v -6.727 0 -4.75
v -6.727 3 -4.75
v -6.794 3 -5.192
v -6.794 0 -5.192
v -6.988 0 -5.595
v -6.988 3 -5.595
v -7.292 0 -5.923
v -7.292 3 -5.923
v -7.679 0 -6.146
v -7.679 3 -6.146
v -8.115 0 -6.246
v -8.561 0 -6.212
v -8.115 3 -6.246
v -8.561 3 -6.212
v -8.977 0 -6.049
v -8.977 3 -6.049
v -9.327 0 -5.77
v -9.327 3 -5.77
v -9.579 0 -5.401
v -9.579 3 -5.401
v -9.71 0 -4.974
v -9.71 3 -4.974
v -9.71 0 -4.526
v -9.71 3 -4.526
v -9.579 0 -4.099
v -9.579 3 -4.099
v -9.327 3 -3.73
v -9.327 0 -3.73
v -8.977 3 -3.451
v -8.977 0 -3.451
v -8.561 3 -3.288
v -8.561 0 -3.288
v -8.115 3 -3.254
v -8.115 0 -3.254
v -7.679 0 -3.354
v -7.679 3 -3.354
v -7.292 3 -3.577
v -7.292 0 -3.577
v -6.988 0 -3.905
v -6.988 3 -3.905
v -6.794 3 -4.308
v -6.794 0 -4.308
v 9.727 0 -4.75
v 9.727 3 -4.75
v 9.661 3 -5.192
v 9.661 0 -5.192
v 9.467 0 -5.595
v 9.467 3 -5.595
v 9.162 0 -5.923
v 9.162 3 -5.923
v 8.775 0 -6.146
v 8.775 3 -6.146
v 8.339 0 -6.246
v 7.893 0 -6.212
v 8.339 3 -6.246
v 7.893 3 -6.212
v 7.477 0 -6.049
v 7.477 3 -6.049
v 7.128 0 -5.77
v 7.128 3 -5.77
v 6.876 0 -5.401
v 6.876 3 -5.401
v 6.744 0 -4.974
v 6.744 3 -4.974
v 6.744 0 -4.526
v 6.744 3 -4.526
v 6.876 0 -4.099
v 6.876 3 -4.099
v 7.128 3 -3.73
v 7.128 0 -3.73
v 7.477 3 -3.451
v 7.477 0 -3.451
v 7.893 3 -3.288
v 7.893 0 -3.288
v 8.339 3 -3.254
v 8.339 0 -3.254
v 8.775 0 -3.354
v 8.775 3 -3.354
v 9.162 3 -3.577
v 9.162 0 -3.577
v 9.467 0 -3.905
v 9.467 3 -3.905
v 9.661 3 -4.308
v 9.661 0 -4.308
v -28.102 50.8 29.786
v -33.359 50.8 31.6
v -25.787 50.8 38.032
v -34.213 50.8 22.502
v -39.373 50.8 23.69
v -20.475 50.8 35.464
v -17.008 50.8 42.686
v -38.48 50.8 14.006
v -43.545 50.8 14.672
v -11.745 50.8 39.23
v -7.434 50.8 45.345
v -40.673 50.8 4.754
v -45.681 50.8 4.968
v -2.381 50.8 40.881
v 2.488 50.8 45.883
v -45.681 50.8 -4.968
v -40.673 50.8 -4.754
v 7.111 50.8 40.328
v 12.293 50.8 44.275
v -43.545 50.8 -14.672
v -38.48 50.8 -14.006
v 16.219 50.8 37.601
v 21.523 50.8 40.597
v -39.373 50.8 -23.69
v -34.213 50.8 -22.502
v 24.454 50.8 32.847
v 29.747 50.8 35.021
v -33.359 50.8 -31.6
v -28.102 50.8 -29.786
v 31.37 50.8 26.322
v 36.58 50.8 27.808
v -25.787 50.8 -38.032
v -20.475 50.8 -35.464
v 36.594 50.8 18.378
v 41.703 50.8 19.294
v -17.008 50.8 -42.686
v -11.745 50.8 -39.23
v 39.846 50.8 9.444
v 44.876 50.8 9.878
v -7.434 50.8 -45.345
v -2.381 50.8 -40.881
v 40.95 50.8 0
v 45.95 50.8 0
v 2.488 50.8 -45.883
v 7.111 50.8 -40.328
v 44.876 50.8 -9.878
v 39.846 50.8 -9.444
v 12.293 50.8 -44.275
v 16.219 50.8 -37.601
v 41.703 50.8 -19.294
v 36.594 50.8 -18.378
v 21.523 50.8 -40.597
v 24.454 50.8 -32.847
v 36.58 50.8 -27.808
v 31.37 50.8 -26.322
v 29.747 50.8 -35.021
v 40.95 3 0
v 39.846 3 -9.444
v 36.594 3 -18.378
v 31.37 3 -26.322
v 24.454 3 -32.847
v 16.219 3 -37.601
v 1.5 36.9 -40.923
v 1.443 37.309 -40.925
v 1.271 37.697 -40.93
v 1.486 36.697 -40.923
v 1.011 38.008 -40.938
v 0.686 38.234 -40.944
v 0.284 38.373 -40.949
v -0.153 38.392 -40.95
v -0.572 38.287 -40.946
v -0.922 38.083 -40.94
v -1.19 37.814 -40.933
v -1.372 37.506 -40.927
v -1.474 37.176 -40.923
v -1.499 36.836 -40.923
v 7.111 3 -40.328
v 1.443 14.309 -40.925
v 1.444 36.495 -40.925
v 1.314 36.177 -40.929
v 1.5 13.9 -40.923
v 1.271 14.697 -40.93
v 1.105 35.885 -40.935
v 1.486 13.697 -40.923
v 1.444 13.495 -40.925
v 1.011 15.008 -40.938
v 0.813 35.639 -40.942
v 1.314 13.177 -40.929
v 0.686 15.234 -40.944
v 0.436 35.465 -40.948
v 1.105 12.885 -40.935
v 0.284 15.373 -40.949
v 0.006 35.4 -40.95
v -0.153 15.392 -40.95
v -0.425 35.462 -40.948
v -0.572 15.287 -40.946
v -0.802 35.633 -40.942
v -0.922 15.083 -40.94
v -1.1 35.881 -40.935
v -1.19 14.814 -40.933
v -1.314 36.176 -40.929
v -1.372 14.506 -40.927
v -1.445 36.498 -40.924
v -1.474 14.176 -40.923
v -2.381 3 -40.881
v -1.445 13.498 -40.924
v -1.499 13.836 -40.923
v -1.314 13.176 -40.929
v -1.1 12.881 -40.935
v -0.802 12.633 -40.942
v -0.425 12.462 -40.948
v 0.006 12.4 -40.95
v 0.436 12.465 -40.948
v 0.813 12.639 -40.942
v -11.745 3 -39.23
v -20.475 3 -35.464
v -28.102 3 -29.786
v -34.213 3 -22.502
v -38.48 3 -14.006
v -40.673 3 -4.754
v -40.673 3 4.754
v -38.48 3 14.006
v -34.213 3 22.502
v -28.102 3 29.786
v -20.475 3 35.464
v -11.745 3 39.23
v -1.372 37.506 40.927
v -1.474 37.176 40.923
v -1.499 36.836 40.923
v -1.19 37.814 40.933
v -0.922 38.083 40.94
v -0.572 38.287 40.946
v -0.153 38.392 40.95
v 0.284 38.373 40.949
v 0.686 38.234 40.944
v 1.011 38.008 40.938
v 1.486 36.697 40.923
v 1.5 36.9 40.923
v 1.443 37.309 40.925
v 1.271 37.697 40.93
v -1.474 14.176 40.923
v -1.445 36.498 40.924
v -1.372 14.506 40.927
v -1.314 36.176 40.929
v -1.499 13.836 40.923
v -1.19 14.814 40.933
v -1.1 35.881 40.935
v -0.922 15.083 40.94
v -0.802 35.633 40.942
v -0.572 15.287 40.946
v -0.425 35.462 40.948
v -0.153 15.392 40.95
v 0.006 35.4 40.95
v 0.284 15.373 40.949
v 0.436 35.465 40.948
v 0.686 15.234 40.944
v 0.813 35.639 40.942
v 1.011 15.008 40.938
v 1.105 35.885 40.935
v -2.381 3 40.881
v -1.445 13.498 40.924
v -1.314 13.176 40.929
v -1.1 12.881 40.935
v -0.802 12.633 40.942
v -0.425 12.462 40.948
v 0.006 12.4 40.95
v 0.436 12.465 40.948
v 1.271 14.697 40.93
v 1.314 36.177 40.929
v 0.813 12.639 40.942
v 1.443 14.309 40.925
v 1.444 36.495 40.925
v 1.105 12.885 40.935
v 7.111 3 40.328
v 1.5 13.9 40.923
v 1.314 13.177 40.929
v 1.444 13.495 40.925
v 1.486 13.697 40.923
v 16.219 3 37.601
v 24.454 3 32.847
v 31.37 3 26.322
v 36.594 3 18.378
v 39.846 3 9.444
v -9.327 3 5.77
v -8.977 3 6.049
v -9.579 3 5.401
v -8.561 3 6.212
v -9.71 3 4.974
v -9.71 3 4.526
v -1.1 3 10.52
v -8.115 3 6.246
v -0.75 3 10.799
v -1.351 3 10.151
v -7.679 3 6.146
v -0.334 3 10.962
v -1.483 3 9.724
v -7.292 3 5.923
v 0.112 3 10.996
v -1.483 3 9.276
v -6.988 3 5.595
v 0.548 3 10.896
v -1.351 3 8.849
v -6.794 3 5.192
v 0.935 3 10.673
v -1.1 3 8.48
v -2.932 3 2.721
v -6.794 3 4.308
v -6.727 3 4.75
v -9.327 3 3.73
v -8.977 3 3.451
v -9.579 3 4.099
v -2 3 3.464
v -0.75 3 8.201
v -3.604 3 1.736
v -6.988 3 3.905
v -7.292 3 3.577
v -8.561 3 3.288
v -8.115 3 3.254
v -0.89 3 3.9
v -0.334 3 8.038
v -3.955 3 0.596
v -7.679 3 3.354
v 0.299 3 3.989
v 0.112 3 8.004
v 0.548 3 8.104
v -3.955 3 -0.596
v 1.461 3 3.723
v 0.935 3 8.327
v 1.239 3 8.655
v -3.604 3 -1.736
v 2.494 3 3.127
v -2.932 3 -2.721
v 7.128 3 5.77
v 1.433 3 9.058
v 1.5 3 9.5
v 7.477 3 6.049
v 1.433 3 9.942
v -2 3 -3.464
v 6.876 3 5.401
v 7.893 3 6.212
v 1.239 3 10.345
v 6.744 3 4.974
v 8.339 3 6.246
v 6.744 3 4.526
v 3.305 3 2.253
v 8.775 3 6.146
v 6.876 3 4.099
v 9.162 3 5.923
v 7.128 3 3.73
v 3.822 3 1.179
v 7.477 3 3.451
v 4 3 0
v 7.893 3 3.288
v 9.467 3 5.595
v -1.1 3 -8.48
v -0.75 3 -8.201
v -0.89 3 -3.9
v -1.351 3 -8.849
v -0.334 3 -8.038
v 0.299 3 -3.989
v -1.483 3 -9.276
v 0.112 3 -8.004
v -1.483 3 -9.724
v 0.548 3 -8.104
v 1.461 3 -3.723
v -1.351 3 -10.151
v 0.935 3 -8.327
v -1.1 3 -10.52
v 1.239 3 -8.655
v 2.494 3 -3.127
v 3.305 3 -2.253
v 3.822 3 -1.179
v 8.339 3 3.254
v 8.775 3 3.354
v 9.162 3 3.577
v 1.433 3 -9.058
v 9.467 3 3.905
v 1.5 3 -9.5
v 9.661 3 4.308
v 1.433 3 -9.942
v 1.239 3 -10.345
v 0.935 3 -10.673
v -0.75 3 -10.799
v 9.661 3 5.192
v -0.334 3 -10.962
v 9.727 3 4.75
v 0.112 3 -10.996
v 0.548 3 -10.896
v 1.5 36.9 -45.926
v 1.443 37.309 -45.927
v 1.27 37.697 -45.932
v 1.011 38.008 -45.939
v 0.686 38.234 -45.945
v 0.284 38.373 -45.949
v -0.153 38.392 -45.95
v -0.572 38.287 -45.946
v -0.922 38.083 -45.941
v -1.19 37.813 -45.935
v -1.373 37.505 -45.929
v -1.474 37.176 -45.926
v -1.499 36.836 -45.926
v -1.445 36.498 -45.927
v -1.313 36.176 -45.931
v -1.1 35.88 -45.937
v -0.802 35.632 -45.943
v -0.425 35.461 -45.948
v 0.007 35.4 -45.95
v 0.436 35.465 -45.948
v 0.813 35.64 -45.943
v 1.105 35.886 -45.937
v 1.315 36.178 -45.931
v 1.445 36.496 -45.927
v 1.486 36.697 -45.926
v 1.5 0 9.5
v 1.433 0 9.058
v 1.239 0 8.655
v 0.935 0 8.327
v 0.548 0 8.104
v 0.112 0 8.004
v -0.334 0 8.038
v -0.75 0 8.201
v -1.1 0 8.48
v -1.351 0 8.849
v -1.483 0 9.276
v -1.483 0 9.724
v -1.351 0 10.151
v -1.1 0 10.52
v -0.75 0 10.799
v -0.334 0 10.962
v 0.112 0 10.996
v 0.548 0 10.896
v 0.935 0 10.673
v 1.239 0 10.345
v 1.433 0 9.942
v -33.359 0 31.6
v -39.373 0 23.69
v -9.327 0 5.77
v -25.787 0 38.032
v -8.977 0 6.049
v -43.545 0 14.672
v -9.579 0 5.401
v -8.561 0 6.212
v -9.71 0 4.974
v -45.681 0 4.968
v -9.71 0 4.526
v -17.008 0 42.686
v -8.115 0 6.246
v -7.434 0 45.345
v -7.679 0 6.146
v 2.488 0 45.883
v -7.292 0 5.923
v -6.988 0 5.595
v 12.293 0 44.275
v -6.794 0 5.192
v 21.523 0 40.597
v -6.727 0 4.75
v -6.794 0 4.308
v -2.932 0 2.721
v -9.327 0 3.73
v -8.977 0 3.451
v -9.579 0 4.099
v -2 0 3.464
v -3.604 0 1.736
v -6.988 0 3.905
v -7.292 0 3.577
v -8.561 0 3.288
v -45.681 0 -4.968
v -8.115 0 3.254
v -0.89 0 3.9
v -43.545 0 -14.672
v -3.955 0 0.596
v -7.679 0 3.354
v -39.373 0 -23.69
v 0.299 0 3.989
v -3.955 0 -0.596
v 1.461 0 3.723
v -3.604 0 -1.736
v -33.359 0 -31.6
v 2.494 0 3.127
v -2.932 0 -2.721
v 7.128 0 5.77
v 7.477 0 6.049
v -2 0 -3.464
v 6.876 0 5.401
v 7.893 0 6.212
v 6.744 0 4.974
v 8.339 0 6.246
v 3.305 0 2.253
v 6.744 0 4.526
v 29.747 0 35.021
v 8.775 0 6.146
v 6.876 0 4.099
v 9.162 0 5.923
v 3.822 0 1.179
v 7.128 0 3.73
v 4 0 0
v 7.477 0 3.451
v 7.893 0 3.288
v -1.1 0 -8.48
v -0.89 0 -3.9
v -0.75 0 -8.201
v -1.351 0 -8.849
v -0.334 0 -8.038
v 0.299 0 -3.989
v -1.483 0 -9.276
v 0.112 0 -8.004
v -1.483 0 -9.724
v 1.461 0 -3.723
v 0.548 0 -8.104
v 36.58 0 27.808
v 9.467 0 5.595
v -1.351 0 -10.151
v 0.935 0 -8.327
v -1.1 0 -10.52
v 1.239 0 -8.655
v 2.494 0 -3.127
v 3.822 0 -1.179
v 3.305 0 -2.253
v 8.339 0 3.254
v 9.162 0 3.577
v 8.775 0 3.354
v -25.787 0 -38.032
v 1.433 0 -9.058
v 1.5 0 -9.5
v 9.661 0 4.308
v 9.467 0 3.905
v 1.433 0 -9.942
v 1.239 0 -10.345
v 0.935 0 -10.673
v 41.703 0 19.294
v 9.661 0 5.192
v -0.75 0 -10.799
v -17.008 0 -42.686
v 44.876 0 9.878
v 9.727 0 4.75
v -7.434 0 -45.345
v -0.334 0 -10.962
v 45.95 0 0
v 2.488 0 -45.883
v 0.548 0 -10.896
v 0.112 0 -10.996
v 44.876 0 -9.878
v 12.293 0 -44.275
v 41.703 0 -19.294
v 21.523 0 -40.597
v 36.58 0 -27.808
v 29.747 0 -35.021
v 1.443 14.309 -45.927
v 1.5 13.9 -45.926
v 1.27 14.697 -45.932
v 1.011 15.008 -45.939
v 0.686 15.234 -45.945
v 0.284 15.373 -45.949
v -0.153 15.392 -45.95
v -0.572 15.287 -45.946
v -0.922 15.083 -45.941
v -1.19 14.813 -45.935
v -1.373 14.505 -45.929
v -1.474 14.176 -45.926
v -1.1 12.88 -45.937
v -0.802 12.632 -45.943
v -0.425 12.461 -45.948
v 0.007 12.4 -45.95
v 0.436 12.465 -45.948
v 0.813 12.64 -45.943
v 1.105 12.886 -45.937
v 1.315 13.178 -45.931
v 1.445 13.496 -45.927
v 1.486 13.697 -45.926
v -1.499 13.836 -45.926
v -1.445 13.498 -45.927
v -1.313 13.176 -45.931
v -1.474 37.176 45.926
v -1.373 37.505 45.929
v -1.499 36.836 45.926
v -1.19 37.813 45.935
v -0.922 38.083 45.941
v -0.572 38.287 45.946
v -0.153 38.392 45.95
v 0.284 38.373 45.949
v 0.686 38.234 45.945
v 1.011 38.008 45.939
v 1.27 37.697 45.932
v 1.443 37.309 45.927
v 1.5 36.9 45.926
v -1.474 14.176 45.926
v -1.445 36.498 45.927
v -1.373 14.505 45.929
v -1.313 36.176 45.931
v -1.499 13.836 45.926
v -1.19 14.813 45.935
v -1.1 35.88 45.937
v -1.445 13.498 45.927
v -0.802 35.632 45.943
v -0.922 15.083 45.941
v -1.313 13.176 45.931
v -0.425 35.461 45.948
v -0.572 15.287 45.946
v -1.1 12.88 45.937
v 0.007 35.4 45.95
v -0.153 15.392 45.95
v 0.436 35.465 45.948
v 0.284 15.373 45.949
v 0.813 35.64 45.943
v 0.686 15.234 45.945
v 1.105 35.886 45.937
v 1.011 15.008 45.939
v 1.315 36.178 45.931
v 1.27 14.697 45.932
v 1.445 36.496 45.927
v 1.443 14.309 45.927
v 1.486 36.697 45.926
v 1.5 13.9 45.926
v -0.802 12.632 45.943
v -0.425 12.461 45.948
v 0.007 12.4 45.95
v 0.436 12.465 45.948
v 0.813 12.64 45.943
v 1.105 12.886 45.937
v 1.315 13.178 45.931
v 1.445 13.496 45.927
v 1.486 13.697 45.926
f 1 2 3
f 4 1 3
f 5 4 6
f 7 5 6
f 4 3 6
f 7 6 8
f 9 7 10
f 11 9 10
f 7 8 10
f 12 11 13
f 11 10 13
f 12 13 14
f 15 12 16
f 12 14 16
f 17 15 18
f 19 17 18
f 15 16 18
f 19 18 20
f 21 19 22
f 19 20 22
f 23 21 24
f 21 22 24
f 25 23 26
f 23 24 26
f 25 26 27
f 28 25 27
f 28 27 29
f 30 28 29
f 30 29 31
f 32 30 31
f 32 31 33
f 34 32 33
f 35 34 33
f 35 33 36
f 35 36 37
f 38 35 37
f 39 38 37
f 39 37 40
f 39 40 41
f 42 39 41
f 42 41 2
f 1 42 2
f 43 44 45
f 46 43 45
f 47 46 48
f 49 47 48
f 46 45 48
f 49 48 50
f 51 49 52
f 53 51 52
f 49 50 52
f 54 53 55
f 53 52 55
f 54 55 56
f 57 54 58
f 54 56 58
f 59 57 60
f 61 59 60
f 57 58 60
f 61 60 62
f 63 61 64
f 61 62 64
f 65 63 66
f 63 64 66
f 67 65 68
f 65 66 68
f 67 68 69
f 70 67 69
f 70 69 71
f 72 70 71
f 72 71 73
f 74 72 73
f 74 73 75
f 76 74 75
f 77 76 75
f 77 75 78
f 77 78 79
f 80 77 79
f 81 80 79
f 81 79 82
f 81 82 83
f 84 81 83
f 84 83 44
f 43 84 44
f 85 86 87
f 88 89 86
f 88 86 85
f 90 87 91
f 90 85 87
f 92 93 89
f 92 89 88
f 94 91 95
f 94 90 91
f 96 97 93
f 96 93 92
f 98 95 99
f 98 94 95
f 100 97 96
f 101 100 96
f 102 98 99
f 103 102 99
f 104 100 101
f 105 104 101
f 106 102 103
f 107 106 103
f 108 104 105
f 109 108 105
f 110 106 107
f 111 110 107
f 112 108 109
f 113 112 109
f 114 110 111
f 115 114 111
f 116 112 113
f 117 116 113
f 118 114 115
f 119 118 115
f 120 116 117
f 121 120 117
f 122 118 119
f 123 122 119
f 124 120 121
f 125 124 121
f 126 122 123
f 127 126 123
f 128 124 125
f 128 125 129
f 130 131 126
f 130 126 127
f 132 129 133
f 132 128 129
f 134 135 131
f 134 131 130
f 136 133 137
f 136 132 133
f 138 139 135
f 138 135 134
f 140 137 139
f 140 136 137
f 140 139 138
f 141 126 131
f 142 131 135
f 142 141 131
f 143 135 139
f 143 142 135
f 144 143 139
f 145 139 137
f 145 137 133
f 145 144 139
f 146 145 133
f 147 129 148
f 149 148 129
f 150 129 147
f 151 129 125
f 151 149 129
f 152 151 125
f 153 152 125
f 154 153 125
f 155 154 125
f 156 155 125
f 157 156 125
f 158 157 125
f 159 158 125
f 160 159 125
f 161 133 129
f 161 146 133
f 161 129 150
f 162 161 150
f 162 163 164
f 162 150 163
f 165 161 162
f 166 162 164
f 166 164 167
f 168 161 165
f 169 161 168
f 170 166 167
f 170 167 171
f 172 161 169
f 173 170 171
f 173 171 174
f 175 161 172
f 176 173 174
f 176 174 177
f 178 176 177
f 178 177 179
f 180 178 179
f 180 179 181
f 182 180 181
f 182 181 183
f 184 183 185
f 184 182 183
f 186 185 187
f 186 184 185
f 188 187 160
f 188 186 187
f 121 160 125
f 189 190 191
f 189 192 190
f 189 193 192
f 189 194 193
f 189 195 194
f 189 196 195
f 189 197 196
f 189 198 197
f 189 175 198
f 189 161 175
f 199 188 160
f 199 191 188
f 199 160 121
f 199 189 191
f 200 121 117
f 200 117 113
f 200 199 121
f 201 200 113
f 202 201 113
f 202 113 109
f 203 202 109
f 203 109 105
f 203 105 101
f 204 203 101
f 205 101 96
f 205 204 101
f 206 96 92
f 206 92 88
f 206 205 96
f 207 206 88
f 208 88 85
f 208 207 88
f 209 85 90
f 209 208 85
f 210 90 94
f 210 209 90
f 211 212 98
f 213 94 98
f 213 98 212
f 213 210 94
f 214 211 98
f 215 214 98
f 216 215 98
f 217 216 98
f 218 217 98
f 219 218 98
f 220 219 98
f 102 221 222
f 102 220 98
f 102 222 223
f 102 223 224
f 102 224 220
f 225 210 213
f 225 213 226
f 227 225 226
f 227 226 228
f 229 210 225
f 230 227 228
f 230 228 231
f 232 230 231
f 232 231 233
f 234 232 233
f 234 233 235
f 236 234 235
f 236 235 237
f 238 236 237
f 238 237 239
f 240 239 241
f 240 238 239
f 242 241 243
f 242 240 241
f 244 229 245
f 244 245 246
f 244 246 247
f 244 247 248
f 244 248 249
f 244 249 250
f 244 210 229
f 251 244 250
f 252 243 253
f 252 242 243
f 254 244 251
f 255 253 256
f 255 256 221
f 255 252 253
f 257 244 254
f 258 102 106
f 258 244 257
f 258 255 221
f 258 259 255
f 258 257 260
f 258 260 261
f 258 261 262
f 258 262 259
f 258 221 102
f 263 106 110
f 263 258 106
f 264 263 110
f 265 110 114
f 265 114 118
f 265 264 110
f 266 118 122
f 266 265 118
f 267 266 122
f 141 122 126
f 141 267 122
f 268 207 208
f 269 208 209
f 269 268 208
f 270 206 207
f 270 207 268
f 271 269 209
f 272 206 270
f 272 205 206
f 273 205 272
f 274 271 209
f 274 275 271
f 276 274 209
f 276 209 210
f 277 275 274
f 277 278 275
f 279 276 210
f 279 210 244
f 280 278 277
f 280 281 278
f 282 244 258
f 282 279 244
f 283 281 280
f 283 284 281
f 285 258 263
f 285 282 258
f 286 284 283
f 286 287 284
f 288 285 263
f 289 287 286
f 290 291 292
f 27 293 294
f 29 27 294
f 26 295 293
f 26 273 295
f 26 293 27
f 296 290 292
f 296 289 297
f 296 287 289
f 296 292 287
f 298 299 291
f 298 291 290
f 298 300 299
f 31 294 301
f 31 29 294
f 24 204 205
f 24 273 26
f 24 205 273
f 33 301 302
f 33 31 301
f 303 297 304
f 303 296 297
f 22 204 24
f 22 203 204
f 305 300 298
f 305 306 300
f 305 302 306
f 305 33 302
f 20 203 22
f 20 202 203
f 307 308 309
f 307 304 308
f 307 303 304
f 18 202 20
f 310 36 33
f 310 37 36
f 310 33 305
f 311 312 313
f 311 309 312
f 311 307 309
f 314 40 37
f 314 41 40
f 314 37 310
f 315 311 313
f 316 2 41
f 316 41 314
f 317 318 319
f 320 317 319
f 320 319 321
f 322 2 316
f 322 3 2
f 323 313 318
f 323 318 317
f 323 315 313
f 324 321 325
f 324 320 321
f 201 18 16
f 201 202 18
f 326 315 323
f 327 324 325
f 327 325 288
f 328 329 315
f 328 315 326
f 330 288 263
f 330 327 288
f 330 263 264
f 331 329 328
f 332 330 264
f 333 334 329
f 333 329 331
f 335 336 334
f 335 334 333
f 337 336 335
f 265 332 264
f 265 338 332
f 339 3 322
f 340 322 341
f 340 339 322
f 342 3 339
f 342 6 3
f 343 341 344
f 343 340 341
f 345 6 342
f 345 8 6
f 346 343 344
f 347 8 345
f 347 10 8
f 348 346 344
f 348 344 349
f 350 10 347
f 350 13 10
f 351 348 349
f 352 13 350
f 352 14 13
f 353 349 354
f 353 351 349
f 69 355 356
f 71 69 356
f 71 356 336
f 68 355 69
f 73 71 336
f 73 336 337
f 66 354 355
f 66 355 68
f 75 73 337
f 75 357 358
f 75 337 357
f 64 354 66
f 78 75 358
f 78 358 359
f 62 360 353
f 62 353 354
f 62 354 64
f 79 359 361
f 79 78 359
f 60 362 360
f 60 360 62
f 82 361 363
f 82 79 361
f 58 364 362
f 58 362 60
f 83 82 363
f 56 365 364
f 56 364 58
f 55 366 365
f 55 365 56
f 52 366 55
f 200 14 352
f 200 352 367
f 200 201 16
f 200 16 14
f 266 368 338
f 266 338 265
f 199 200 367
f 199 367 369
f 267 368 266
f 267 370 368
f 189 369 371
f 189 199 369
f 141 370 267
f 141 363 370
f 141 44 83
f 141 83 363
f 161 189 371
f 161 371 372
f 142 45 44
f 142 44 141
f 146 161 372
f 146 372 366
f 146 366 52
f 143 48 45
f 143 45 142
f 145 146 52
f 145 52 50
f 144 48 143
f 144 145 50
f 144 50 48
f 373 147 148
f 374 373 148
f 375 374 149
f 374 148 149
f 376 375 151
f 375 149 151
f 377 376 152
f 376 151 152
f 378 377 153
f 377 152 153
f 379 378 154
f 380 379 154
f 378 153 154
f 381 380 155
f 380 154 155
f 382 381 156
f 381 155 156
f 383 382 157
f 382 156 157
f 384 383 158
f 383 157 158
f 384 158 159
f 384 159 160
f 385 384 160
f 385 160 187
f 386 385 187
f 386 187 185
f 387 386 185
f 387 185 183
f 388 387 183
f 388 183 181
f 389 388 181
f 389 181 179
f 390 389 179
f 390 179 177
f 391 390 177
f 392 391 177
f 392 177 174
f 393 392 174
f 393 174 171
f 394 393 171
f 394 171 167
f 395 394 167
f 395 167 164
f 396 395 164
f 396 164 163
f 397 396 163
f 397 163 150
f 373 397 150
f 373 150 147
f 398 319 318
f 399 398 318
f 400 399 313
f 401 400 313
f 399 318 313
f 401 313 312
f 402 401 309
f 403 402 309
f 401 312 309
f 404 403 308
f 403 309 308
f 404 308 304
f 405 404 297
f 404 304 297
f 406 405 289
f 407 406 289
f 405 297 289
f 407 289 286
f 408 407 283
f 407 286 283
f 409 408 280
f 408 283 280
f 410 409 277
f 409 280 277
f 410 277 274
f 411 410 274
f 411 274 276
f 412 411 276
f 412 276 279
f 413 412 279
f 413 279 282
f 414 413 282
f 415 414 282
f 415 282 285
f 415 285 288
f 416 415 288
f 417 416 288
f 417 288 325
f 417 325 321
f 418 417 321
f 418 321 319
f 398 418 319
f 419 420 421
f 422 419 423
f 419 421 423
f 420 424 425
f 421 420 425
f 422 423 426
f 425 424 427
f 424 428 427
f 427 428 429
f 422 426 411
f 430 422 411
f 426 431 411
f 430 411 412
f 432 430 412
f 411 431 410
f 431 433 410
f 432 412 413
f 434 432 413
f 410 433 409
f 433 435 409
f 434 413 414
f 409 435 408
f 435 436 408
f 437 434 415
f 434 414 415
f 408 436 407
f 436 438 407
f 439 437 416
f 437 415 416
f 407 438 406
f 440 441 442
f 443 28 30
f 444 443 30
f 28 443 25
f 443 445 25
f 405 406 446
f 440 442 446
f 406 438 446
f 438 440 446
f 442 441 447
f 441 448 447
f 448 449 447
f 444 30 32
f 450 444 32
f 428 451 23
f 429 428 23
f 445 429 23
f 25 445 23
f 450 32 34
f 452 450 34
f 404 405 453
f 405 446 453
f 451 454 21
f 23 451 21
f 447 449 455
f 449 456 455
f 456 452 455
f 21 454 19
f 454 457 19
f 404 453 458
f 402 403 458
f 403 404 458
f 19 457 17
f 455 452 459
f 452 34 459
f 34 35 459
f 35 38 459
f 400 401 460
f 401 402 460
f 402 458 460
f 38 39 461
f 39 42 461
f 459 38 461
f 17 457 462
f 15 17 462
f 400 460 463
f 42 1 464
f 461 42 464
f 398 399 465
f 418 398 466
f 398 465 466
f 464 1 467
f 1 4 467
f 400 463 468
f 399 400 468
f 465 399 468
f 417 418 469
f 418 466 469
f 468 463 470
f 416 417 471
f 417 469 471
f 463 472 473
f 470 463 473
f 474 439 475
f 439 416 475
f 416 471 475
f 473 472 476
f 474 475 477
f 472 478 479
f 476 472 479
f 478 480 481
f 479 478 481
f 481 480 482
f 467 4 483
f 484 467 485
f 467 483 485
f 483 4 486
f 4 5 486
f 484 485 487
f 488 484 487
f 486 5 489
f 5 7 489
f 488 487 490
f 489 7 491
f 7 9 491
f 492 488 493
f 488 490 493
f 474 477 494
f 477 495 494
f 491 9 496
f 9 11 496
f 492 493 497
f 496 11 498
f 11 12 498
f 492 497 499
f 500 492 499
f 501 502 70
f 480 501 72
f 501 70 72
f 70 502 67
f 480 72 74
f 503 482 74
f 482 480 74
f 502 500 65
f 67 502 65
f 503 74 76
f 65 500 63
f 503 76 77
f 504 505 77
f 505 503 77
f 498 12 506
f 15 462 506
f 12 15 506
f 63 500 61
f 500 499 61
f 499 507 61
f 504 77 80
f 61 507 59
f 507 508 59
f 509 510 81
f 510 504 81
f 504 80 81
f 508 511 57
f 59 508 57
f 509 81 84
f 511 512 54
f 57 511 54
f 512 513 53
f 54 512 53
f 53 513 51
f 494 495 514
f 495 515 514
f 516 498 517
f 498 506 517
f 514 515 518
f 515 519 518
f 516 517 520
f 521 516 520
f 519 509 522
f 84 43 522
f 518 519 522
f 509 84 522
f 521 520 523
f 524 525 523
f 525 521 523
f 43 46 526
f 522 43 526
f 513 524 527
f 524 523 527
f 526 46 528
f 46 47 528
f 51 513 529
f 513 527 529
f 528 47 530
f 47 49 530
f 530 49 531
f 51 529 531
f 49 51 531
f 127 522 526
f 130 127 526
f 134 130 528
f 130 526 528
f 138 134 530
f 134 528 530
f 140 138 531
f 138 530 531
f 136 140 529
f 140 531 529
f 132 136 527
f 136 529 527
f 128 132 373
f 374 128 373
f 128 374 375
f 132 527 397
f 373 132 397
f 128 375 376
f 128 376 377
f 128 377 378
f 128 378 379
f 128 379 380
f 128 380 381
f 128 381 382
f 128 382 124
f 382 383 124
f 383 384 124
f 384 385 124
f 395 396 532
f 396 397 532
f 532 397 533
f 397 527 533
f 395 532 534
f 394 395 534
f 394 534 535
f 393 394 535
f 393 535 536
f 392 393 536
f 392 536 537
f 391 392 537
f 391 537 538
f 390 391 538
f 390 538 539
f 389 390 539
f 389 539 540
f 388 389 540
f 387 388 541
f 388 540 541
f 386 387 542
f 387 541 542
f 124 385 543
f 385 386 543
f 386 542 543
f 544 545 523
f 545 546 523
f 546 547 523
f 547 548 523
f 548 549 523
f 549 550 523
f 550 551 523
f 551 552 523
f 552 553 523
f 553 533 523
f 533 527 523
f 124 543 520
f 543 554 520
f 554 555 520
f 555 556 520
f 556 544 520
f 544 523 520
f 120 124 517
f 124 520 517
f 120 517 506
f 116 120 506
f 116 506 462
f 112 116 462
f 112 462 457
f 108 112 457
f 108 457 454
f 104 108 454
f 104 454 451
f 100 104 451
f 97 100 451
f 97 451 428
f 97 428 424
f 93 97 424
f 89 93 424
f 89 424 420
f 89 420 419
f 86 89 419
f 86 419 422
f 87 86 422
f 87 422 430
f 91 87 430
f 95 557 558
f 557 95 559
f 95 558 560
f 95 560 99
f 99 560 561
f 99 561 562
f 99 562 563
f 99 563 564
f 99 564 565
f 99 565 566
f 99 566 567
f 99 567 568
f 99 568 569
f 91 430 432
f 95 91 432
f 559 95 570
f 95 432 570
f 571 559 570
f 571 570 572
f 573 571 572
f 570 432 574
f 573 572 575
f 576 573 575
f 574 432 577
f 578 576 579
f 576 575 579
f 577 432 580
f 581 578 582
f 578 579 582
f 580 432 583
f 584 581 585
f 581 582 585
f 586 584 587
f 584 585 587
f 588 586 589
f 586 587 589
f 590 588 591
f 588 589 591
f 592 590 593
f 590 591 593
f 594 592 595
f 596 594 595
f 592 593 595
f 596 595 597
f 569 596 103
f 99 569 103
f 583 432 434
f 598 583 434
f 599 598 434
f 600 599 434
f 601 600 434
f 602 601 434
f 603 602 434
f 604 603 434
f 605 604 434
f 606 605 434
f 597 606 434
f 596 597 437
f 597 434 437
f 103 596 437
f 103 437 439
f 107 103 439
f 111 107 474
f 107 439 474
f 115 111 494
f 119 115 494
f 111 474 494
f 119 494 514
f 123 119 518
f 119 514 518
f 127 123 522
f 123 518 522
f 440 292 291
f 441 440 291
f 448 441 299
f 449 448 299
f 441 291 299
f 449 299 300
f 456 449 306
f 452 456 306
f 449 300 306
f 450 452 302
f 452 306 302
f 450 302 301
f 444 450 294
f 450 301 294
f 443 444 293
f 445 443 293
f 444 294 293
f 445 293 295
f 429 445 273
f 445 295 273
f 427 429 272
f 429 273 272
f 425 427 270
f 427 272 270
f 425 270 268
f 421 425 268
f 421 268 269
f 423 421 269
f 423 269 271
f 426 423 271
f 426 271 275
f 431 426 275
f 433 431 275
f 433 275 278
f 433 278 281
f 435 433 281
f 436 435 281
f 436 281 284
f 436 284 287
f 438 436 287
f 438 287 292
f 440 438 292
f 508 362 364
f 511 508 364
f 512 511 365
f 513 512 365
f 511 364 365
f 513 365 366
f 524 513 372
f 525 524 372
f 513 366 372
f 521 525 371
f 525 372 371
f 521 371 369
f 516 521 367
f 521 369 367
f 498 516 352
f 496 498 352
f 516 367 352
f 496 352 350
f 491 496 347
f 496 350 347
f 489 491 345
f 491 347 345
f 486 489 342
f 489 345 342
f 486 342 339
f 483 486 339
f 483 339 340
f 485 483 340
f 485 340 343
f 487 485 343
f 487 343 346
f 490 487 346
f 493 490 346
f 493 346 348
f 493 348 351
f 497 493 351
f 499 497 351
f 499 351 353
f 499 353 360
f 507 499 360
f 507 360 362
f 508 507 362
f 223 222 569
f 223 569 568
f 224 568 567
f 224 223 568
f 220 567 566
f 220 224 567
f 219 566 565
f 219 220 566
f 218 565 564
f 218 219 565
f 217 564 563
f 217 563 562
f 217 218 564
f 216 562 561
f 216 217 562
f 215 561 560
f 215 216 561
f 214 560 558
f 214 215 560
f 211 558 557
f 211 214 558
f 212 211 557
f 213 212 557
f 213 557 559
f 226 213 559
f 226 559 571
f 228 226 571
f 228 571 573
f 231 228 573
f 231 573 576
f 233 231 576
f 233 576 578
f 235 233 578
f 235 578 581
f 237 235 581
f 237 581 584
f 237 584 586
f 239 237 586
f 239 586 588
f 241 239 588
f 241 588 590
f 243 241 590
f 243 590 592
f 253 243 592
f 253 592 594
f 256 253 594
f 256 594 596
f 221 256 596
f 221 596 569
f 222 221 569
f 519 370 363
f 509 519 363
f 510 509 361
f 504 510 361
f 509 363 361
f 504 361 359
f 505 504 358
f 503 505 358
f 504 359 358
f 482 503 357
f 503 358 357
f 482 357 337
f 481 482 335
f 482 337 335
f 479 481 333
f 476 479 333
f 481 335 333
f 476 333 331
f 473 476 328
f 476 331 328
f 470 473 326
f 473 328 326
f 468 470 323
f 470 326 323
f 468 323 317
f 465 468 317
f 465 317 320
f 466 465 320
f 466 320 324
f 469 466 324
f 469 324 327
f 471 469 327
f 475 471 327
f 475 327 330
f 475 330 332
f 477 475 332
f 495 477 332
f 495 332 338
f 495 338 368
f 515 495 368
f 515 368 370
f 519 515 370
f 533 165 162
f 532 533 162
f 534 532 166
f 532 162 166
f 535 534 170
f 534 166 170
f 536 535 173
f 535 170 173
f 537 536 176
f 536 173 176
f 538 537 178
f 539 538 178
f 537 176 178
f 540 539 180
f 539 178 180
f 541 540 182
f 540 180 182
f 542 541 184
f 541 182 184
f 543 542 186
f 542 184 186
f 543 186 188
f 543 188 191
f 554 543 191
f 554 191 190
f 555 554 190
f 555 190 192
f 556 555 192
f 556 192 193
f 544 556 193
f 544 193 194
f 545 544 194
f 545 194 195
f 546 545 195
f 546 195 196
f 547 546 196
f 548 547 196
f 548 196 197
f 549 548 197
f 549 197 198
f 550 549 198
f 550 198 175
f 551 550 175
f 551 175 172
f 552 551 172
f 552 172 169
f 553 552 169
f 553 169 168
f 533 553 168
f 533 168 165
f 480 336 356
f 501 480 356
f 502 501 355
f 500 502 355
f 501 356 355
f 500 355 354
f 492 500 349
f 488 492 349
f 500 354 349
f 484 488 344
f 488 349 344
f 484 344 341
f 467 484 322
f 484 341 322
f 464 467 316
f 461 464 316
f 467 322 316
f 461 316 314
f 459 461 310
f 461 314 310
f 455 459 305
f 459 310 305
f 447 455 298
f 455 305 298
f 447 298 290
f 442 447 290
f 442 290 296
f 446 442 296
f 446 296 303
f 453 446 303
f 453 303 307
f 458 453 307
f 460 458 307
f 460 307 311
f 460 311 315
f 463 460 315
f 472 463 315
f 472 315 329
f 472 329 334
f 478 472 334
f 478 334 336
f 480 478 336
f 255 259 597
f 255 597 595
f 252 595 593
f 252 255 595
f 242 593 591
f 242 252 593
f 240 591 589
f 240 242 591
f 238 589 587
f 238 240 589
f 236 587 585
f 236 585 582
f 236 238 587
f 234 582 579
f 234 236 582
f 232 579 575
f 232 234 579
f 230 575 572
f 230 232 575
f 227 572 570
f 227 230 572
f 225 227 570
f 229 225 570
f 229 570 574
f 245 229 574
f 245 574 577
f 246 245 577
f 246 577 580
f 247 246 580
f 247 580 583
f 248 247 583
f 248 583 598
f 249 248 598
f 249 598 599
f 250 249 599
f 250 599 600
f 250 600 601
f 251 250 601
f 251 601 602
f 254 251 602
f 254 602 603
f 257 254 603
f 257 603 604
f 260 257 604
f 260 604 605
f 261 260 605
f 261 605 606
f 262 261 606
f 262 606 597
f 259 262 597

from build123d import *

# Parameters (mm, degrees)
SKETCH1_R               = 45.95
BOSS_EXTRUDE1_DEPTH     = 3
SKETCH2_R               = 45.95
SKETCH2_R_2             = 40.95
BOSS_EXTRUDE2_DEPTH     = 22.4
SKETCH11_R              = 1.5
CUT_EXTRUDE1_DEPTH      = 46.95
CUT_EXTRUDE1_DEPTH_BACK = 46.95
SKETCH12_R              = 45.95
SKETCH12_R_2            = 40.95
BOSS_EXTRUDE3_DEPTH     = 25.4
SKETCH14_R              = 1.5
CUT_EXTRUDE2_DEPTH      = 46.95000011
CUT_EXTRUDE2_DEPTH_BACK = 46.95000011
SKETCH17_R              = 1.5
CUT_EXTRUDE4_DEPTH      = 10
SKETCH15_R              = 4
CUT_EXTRUDE6_DEPTH      = 10


with BuildPart() as part:
    # Sketch1 → Boss-Extrude1 (new body)
    with BuildSketch(Plane(origin=(0, 0, 0), x_dir=(1, 0, 0), z_dir=(0, 1, 0))):
        Circle(SKETCH1_R)
    extrude(amount=BOSS_EXTRUDE1_DEPTH)

    # Sketch2 → Boss-Extrude2 (add)
    with BuildSketch(Plane(origin=(0, 3, 0), x_dir=(1, 0, 0), z_dir=(0, 1, 0))):
        Circle(SKETCH2_R)
        Circle(SKETCH2_R_2, mode=Mode.SUBTRACT)
    extrude(amount=BOSS_EXTRUDE2_DEPTH)

    # Sketch11 → Cut-Extrude1 (cut, two sides)
    with BuildSketch(Plane.XY) as cut_extrude1_sk:
        with Locations((0, 13.9)):
            Circle(SKETCH11_R)
        with Locations((0, -13.9)):
            Circle(SKETCH11_R)
    extrude(amount=CUT_EXTRUDE1_DEPTH, mode=Mode.SUBTRACT)
    extrude(cut_extrude1_sk.sketch, amount=-CUT_EXTRUDE1_DEPTH_BACK, mode=Mode.SUBTRACT)

    # Sketch12 → Boss-Extrude3 (add)
    with BuildSketch(Plane(origin=(0, 25.4, 0), x_dir=(1, 0, 0), z_dir=(0, 1, 0))):
        Circle(SKETCH12_R)
        Circle(SKETCH12_R_2, mode=Mode.SUBTRACT)
    extrude(amount=BOSS_EXTRUDE3_DEPTH)

    # Sketch14 → Cut-Extrude2 (cut, two sides)
    with BuildSketch(Plane.XY) as cut_extrude2_sk:
        with Locations((0, 36.9)):
            Circle(SKETCH14_R)
    extrude(amount=CUT_EXTRUDE2_DEPTH, mode=Mode.SUBTRACT)
    extrude(cut_extrude2_sk.sketch, amount=-CUT_EXTRUDE2_DEPTH_BACK, mode=Mode.SUBTRACT)

    # Sketch17 → Cut-Extrude4 (cut)
    with BuildSketch(Plane(origin=(0, 3, 0), x_dir=(1, 0, 0), z_dir=(0, 1, 0))):
        with Locations((0, 9.5)):
            Circle(SKETCH17_R)
        with Locations((8.227241336, 4.75)):
            Circle(SKETCH17_R)
        with Locations((8.227241336, -4.75)):
            Circle(SKETCH17_R)
        with Locations((0, -9.5)):
            Circle(SKETCH17_R)
        with Locations((-8.227241336, -4.75)):
            Circle(SKETCH17_R)
        with Locations((-8.227241336, 4.75)):
            Circle(SKETCH17_R)
    extrude(amount=-CUT_EXTRUDE4_DEPTH, mode=Mode.SUBTRACT)

    # Sketch15 → Cut-Extrude6 (cut)
    with BuildSketch(Plane(origin=(0, 3, 0), x_dir=(1, 0, 0), z_dir=(0, 1, 0))):
        Circle(SKETCH15_R)
    extrude(amount=-CUT_EXTRUDE6_DEPTH, mode=Mode.SUBTRACT)


solid = part.part
